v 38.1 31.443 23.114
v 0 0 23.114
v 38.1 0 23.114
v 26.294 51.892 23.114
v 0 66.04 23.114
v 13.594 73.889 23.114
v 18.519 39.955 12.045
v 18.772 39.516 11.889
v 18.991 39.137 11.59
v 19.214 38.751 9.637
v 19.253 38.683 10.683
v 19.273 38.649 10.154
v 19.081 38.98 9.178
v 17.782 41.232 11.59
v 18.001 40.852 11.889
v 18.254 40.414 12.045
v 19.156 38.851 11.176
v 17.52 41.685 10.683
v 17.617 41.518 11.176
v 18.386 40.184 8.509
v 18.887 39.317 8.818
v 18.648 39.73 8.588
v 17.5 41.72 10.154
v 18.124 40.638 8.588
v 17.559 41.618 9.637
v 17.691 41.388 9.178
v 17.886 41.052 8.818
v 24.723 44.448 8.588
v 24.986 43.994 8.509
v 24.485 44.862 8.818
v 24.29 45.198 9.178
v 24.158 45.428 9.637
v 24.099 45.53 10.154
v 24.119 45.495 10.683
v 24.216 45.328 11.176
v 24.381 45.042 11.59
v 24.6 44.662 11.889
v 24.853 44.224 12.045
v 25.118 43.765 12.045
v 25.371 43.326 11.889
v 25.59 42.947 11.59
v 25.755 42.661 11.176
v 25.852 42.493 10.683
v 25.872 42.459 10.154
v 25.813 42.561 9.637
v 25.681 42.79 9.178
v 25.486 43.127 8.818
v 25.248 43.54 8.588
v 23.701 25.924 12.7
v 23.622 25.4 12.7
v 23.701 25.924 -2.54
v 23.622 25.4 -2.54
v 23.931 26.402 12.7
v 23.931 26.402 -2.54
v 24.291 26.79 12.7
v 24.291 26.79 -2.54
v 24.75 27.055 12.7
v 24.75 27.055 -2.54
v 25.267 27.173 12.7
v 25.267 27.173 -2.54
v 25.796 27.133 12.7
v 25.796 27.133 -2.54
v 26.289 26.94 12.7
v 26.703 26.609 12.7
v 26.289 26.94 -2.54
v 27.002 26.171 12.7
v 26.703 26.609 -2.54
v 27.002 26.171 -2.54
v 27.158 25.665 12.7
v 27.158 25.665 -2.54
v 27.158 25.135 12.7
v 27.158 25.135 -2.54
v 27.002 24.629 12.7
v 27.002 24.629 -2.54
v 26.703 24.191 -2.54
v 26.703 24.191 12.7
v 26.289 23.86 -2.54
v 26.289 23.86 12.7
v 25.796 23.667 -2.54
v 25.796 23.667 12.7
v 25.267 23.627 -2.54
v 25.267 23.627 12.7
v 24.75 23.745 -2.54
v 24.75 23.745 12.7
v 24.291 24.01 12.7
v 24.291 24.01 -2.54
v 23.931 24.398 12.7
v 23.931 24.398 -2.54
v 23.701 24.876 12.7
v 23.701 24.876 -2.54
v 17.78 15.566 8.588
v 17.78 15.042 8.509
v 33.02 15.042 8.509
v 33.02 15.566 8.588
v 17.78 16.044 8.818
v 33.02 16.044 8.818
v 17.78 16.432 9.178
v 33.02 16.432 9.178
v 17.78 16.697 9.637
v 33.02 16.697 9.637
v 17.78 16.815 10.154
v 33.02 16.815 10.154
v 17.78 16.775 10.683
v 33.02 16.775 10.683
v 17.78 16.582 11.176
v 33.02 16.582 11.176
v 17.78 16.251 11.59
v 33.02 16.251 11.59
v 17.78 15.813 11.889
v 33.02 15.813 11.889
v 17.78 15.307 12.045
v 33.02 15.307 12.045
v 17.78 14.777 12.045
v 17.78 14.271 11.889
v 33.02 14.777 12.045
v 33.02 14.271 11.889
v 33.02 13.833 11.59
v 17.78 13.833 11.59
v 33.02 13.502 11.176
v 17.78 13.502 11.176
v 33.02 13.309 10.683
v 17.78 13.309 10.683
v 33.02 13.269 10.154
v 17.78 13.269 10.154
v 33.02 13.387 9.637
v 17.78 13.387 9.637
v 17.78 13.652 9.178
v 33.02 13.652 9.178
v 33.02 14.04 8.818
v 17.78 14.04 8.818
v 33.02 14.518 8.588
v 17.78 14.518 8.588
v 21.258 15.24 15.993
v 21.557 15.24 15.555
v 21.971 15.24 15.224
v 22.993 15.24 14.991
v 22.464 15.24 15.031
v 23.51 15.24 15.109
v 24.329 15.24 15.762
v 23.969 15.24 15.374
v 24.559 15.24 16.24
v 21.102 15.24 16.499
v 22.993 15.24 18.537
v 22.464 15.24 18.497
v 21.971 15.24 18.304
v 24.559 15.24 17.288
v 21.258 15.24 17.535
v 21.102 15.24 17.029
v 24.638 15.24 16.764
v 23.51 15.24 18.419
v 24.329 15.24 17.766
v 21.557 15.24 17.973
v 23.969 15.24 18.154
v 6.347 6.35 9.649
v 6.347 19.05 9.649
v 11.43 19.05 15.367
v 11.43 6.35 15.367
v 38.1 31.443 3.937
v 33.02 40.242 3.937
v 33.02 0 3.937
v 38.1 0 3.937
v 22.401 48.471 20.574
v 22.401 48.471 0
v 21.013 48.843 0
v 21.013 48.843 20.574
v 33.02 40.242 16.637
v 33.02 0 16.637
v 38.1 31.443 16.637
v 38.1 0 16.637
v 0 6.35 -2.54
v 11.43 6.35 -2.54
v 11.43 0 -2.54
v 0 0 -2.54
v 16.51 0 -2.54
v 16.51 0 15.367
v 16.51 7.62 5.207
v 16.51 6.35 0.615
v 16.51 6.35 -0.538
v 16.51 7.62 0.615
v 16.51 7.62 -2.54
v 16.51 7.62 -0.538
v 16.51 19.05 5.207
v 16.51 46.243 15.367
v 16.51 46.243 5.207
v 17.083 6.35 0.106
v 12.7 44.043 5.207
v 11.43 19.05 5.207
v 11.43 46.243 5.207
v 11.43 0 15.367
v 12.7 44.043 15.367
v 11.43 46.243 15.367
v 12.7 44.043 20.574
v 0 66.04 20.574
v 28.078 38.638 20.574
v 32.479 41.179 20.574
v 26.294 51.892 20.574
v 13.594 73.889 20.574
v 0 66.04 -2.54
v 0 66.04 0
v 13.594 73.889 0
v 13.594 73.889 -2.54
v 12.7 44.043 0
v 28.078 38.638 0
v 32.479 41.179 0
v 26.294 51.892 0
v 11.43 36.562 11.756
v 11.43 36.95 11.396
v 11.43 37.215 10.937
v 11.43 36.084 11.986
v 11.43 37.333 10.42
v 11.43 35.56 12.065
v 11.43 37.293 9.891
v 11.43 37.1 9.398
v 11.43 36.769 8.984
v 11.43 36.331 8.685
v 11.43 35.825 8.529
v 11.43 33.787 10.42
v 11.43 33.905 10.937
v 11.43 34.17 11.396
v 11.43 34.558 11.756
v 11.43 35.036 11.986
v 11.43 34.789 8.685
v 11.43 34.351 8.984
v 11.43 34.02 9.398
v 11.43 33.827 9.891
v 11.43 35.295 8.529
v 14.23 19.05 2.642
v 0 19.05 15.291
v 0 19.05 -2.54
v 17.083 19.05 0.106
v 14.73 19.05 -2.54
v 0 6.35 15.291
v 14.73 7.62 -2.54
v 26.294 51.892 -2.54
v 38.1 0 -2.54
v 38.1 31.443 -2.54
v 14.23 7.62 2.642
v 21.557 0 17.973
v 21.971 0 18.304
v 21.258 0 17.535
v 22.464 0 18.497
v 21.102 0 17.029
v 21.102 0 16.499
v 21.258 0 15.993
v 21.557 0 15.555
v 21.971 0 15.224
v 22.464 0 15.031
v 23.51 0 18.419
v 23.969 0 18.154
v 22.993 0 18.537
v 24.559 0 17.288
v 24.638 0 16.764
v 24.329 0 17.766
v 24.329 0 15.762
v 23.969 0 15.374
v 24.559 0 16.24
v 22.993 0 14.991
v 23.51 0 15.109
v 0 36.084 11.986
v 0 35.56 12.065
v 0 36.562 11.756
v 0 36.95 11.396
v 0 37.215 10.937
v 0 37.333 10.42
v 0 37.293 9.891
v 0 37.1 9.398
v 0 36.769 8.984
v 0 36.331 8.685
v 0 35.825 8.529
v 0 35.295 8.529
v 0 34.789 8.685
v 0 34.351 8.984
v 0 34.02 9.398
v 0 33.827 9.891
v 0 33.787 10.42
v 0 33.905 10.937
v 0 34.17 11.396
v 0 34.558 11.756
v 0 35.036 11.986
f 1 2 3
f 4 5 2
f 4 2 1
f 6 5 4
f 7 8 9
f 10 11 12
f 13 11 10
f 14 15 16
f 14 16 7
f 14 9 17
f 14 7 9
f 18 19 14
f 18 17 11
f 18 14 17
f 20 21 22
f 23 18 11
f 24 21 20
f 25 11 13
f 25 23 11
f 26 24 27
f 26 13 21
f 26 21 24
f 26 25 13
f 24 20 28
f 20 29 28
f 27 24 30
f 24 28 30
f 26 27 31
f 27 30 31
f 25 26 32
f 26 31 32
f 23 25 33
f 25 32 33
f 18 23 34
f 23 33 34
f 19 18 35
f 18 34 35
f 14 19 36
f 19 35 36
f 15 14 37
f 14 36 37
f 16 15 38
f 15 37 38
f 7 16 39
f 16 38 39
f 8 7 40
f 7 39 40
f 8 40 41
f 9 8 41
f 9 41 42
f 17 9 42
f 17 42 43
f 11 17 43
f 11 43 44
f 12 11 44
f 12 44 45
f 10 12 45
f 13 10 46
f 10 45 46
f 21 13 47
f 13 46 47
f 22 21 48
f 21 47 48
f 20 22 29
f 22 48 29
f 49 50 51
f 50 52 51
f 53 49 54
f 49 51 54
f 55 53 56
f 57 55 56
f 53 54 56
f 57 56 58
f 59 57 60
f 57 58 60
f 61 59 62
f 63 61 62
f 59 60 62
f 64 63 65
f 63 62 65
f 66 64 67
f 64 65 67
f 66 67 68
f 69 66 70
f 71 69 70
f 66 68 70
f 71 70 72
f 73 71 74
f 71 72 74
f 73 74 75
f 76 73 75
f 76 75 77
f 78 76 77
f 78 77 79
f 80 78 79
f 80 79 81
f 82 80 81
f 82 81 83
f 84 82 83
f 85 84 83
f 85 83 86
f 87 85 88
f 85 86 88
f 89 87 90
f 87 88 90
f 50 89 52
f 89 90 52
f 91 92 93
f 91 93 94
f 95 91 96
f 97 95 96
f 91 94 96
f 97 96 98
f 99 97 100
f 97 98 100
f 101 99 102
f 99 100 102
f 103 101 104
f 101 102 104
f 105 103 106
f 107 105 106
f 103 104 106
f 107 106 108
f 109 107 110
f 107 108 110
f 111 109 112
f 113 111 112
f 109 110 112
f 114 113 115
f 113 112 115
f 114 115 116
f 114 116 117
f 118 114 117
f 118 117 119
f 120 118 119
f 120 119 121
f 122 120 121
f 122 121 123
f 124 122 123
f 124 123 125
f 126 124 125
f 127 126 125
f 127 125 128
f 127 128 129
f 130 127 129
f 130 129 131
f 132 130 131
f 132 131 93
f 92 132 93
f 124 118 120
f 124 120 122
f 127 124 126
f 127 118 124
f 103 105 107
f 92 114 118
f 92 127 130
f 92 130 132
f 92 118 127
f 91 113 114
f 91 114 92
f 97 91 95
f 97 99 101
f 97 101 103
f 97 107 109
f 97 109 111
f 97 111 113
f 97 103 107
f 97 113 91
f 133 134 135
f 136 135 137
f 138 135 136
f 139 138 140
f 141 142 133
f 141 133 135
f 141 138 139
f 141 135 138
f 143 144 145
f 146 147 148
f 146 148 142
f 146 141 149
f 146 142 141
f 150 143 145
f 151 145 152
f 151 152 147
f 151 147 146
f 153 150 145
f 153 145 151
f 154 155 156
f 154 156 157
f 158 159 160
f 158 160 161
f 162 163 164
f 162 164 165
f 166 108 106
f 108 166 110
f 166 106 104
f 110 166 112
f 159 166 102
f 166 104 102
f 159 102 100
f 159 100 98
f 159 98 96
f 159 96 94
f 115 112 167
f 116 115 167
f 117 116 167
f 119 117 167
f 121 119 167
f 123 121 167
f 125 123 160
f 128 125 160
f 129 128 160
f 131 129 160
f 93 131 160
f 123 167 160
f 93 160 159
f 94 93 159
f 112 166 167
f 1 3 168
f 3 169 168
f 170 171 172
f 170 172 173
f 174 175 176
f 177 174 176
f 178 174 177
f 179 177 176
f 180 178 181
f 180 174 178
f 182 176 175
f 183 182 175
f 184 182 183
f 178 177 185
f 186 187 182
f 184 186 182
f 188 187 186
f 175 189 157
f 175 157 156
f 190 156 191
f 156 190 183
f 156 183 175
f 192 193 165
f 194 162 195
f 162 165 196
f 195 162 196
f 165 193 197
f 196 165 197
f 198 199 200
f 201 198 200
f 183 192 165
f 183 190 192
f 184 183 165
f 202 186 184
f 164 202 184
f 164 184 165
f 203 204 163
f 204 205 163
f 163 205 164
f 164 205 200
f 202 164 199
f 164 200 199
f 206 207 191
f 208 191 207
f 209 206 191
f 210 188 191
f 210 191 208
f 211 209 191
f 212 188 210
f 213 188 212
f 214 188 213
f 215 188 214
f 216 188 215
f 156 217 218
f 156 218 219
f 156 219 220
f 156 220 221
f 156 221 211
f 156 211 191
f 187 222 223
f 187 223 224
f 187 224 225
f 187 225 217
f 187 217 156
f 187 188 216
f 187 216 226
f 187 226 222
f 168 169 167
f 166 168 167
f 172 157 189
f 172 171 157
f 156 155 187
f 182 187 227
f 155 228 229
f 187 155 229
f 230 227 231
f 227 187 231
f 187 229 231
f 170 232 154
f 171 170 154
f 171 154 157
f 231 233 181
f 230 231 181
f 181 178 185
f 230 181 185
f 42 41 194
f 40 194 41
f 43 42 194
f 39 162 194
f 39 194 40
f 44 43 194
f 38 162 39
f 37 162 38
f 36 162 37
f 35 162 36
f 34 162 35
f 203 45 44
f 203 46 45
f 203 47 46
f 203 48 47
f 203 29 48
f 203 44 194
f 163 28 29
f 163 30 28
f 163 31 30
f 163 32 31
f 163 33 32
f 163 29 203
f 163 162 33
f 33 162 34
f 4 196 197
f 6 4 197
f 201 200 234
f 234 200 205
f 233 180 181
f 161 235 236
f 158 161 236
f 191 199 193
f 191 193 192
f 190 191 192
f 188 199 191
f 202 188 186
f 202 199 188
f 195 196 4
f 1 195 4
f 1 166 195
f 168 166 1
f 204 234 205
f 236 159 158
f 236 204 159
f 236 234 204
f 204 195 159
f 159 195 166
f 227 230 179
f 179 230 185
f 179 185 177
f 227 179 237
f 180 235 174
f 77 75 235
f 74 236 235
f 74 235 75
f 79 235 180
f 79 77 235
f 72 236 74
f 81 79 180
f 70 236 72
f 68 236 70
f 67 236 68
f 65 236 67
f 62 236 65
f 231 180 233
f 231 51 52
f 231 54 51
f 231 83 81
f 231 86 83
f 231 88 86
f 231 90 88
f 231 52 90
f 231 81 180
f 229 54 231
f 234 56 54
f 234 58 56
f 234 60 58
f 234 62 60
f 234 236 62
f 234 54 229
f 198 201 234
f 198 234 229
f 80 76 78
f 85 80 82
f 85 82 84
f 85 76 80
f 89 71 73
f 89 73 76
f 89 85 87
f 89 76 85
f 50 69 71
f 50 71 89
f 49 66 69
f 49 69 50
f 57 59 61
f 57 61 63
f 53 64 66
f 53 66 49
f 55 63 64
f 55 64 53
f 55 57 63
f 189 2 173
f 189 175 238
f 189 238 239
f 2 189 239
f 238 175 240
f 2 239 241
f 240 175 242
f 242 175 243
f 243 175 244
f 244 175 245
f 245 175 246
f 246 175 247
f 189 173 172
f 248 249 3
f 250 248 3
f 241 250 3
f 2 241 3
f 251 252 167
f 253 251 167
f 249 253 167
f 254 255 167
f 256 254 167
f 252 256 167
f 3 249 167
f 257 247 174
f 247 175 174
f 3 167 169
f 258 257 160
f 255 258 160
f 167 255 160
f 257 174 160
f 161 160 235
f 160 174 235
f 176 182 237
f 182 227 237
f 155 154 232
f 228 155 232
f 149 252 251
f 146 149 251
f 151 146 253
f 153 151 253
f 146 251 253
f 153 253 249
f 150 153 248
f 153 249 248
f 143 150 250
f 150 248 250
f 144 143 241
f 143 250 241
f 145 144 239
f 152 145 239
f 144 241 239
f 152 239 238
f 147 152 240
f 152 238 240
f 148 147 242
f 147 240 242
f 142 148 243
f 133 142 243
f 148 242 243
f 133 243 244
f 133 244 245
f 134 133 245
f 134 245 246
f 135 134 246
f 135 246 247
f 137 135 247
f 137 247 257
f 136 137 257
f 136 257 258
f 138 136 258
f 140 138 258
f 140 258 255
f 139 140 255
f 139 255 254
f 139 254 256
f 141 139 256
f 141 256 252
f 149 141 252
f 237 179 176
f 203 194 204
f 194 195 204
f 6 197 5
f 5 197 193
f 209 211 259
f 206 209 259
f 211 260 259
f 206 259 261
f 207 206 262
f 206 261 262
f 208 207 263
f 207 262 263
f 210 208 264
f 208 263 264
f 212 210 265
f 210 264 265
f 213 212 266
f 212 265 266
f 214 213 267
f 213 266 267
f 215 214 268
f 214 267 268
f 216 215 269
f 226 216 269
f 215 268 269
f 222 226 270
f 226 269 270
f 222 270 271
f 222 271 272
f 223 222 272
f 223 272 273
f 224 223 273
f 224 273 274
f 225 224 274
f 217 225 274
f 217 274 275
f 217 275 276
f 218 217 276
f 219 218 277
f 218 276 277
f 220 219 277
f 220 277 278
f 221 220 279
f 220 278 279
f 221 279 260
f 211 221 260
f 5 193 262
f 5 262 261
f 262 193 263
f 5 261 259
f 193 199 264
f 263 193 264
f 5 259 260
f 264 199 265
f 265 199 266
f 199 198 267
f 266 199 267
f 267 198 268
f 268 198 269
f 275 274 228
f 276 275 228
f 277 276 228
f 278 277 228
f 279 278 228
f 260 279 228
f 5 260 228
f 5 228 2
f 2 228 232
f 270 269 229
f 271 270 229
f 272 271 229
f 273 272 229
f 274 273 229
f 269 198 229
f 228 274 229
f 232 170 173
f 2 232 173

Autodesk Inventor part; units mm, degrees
ref_plane "YZ Plane" through (0, 0, 0) normal (1, 0, 0) x (0, 1, 0)
ref_plane "XZ Plane" through (0, 0, 0) normal (0, 1, 0) x (-1, 0, 0)
sketch "Sketch1" plane through (0, 0, 0) normal (0, 0, 1) x (1, 0, 0)
  line L0 (0, 0) -> (38.1, 0)
  line L1 (38.1, 0) -> (38.1, 31.4433)
  line L2 (0, 66.04) -> (0, 0)
  line L3 (0, 66.04) -> (13.5942, 73.8886)
  line L4 (0, 66.04) -> (12.7, 44.043)
  line L5 (12.7, 44.043) -> (26.2942, 51.8916)
  line L6 (26.2942, 51.8916) -> (13.5942, 73.8886)
  line L7 (26.2942, 51.8916) -> (38.1, 31.4433)
  dimension "d0" = 15.6972
  dimension "d1" = 25.4
  dimension "d2" = 38.1
  dimension "d3" = 66.04
  dimension "d4" = 120
extrude "Extrusion1" add sketch "Sketch1" along normal blind 20.574 contours L2 L4 L5 L7 L1 L0
sketch "Sketch2" plane through (0, 0, 20.574) normal (0, 0, 1) x (1, 0, 0)
  line L0 (0, 66.04) -> (0, 0) projected
  line L1 (0, 0) -> (38.1, 0) projected
  line L2 (38.1, 0) -> (38.1, 31.4433) projected
  line L3 (38.1, 31.4433) -> (26.2942, 51.8916) projected
  line L4 (26.2942, 51.8916) -> (12.7, 44.043) projected
  line L5 (12.7, 44.043) -> (0, 66.04) projected
  line L6 (26.2942, 51.8916) -> (13.5942, 73.8886)
  line L7 (13.5942, 73.8886) -> (0, 66.04)
  line L8 (38.1, 31.4433) -> (26.2942, 51.8916) projected
extrude "Extrusion2" add sketch "Sketch2" along normal blind 2.54
ref_plane "Work Plane1" through (0, 0, 10.287) normal (0, 0, -1) x (-1, 0, 0)
mirror "Mirror1" about plane through (0, 0, 10.287) normal (0, 0, -1) of "Extrusion2"
sketch "Sketch3" plane through (0, 0, 23.114) normal (0, -1, 0) x (1, 0, 0)
  line L0 (38.1, -25.654) -> (38.1, 0) projected
  line L1 (38.1, -6.477) -> (33.02, -6.477)
  line L2 (33.02, -6.477) -> (33.02, -19.177)
  line L3 (33.02, -19.177) -> (38.1, -19.177)
  line L4 (38.1, -19.177) -> (38.1, -6.477)
  point P0 (0, -23.114)
  point P1 (38.1, -12.827)
  dimension "d9" = 12.7
  dimension "d10" = 5.08
  dimension "d11" = 6.35
extrude "Extrusion3" cut sketch "Sketch3" against normal blind 111.125
sketch "Sketch4" plane through (33.02, 0, 16.637) normal (1, 0, 0) x (0, 0, -1)
  circle A0 centre (6.35, 15.042) radius 1.778 projected
  point P0 (16.637, 0)
extrude "Extrusion4" cut sketch "Sketch4" against normal blind 15.24
sketch "Sketch5" plane through (13.5942, 73.8886, 23.114) normal (0.8660254, 0.5, 0) x (0, 0, -1)
  line L0 (23.114, -25.4) -> (2.54, -25.4) projected
  line L1 (23.114, -25.4) -> (2.54, -25.4)
  line L2 (2.54, -25.4) -> (2.54, -37.7698)
  line L3 (2.54, -37.7698) -> (23.114, -37.7698)
  line L4 (23.114, -37.7698) -> (23.114, -25.4)
  point P0 (23.114, -57.1923)
  dimension "d16" = 12.3698
extrude "Extrusion5" cut sketch "Sketch5" against normal blind 5.08
chamfer "Chamfer1" distance 1.016 angle 45 1 edges at (21.893, 49.3506, 10.287)
sketch "Sketch6" plane through (9.1948, 71.3486, 23.114) normal (0.8660254, 0.5, 0) x (0, 0, -1)
  line L0 (22.86, -25.4) -> (2.54, -25.4) projected
  line L1 (23.114, -37.7698) -> (2.54, -37.7698) projected
  line L2 (2.54, -25.4) -> (2.54, 0) projected
  line L3 (2.54, -37.7698) -> (2.54, 0) projected
  line L4 (2.54, -25.4) -> (2.54, -37.7698)
  circle A0 centre (12.827, -31.5849) radius 1.778
  point P0 (23.114, -57.1923)
  point P1 (2.54, -31.5849)
  point P2 (12.827, -37.7698)
  dimension "d22" = 3.556
extrude "Extrusion6" cut sketch "Sketch6" against normal blind 7.62
ref_plane "Work Plane2" through (0, 0, 10.287) normal (0, 0, 1) x (1, 0, 0)
sketch "Sketch7" plane through (0, 0, 10.287) normal (0, 0, 1) x (1, 0, 0)
  line L0 (12.7, 44.043) -> (-2.54, 70.4394) projected
  line L1 (21.0809, 48.8817) -> (12.7, 44.043) projected
  line L2 (16.51, 46.2427) -> (11.43, 46.2427)
  line L3 (11.43, 46.2427) -> (11.43, 0)
  line L4 (11.43, 0) -> (16.51, 0)
  line L5 (16.51, 0) -> (16.51, 46.2427)
  line L6 (0, 0) -> (38.1, 0) projected
  dimension "d25" = 5.08
extrude "Extrusion7" cut sketch "Sketch7" along normal mid plane 10.16 contours L1 L5 L4 L3 L0
ref_plane "Work Plane3" through (0, 6.35, 23.114) normal (0, -1, 0) x (1, 0, 0)
sketch "Sketch8" plane through (0, 6.35, 23.114) normal (0, -1, 0) x (1, 0, 0)
  line L0 (0, -25.654) -> (38.1, -25.654) projected
  line L1 (0, -25.654) -> (0, 0) projected
  line L2 (14.7303, -25.654) -> (17.0826, -23.0077)
  line L3 (17.0826, -23.0077) -> (0, -7.8232)
  line L4 (4.8537, -36.7652) -> (14.7303, -25.654) projected
  line L5 (0, -32.4508) -> (-19.3376, -15.2619) projected
  point P0 (0, -23.114)
  dimension "d37" = 17.8308
extrude "Extrusion8" cut sketch "Sketch8" against normal blind 12.7
sketch "Sketch9" plane through (0, 6.35, 15.2908) normal (-0.6643638, 0, -0.7474093) x (-0.7474093, 0, 0.6643638)
  line L0 (-8.4923, 39.8927) -> (-8.4923, -6.35) projected
  line L1 (-19.039, 39.8927) -> (-19.039, -6.35) projected
  line L2 (-22.8557, 0) -> (0, 0) projected
  line L3 (0, 12.7) -> (-22.8557, 12.7) projected
  point P0 (-10.1587, -6.35)
  point P1 (-8.4923, 12.7)
  point P2 (-19.039, 12.7)
  point P3 (-19.039, 0)
  point P4 (-8.4923, 0)
extrude "Extrusion9" cut sketch "Sketch9" against normal up to next
sketch "Sketch11" plane through (0, 0, 23.114) normal (-1, 0, 0) x (0, 0, 1)
  circle A0 centre (-12.827, 35.56) radius 1.778 projected
  point P0 (-23.114, 0)
extrude "Extrusion11" cut sketch "Sketch11" against normal blind 15.24
sketch "Sketch13" plane through (0, 0, 23.114) normal (0, -1, 0) x (1, 0, 0)
  circle A0 centre (22.86, -6.35) radius 1.778 projected
  point P0 (0, -23.114)
extrude "Extrusion13" cut sketch "Sketch13" against normal blind 15.24
sketch "Sketch14" plane through (38.1, 0, -2.54) normal (0, 0, -1) x (-1, 0, 0)
  circle A0 centre (12.7, 25.4) radius 1.778 projected
  point P0 (38.1, 0)
extrude "Extrusion14" cut sketch "Sketch14" against normal blind 15.24
sketch "Sketch15" plane through (0, 0, 5.207) normal (0, 0, 1) x (1, 0, 0)
  line L0 (16.51, 6.35) -> (16.51, 0) projected
  line L1 (11.43, 0) -> (16.51, 0)
  line L2 (16.51, 0) -> (16.51, 7.62)
  line L3 (16.51, 7.62) -> (11.43, 7.62)
  line L4 (11.43, 7.62) -> (11.43, 0)
  point P0 (0, 0)
  dimension "d50" = 7.62
extrude "Extrusion15" cut sketch "Sketch15" against normal blind 12.7
equation "\"d11\" = 0.5 * d9"
properties part number "PALM 4"
